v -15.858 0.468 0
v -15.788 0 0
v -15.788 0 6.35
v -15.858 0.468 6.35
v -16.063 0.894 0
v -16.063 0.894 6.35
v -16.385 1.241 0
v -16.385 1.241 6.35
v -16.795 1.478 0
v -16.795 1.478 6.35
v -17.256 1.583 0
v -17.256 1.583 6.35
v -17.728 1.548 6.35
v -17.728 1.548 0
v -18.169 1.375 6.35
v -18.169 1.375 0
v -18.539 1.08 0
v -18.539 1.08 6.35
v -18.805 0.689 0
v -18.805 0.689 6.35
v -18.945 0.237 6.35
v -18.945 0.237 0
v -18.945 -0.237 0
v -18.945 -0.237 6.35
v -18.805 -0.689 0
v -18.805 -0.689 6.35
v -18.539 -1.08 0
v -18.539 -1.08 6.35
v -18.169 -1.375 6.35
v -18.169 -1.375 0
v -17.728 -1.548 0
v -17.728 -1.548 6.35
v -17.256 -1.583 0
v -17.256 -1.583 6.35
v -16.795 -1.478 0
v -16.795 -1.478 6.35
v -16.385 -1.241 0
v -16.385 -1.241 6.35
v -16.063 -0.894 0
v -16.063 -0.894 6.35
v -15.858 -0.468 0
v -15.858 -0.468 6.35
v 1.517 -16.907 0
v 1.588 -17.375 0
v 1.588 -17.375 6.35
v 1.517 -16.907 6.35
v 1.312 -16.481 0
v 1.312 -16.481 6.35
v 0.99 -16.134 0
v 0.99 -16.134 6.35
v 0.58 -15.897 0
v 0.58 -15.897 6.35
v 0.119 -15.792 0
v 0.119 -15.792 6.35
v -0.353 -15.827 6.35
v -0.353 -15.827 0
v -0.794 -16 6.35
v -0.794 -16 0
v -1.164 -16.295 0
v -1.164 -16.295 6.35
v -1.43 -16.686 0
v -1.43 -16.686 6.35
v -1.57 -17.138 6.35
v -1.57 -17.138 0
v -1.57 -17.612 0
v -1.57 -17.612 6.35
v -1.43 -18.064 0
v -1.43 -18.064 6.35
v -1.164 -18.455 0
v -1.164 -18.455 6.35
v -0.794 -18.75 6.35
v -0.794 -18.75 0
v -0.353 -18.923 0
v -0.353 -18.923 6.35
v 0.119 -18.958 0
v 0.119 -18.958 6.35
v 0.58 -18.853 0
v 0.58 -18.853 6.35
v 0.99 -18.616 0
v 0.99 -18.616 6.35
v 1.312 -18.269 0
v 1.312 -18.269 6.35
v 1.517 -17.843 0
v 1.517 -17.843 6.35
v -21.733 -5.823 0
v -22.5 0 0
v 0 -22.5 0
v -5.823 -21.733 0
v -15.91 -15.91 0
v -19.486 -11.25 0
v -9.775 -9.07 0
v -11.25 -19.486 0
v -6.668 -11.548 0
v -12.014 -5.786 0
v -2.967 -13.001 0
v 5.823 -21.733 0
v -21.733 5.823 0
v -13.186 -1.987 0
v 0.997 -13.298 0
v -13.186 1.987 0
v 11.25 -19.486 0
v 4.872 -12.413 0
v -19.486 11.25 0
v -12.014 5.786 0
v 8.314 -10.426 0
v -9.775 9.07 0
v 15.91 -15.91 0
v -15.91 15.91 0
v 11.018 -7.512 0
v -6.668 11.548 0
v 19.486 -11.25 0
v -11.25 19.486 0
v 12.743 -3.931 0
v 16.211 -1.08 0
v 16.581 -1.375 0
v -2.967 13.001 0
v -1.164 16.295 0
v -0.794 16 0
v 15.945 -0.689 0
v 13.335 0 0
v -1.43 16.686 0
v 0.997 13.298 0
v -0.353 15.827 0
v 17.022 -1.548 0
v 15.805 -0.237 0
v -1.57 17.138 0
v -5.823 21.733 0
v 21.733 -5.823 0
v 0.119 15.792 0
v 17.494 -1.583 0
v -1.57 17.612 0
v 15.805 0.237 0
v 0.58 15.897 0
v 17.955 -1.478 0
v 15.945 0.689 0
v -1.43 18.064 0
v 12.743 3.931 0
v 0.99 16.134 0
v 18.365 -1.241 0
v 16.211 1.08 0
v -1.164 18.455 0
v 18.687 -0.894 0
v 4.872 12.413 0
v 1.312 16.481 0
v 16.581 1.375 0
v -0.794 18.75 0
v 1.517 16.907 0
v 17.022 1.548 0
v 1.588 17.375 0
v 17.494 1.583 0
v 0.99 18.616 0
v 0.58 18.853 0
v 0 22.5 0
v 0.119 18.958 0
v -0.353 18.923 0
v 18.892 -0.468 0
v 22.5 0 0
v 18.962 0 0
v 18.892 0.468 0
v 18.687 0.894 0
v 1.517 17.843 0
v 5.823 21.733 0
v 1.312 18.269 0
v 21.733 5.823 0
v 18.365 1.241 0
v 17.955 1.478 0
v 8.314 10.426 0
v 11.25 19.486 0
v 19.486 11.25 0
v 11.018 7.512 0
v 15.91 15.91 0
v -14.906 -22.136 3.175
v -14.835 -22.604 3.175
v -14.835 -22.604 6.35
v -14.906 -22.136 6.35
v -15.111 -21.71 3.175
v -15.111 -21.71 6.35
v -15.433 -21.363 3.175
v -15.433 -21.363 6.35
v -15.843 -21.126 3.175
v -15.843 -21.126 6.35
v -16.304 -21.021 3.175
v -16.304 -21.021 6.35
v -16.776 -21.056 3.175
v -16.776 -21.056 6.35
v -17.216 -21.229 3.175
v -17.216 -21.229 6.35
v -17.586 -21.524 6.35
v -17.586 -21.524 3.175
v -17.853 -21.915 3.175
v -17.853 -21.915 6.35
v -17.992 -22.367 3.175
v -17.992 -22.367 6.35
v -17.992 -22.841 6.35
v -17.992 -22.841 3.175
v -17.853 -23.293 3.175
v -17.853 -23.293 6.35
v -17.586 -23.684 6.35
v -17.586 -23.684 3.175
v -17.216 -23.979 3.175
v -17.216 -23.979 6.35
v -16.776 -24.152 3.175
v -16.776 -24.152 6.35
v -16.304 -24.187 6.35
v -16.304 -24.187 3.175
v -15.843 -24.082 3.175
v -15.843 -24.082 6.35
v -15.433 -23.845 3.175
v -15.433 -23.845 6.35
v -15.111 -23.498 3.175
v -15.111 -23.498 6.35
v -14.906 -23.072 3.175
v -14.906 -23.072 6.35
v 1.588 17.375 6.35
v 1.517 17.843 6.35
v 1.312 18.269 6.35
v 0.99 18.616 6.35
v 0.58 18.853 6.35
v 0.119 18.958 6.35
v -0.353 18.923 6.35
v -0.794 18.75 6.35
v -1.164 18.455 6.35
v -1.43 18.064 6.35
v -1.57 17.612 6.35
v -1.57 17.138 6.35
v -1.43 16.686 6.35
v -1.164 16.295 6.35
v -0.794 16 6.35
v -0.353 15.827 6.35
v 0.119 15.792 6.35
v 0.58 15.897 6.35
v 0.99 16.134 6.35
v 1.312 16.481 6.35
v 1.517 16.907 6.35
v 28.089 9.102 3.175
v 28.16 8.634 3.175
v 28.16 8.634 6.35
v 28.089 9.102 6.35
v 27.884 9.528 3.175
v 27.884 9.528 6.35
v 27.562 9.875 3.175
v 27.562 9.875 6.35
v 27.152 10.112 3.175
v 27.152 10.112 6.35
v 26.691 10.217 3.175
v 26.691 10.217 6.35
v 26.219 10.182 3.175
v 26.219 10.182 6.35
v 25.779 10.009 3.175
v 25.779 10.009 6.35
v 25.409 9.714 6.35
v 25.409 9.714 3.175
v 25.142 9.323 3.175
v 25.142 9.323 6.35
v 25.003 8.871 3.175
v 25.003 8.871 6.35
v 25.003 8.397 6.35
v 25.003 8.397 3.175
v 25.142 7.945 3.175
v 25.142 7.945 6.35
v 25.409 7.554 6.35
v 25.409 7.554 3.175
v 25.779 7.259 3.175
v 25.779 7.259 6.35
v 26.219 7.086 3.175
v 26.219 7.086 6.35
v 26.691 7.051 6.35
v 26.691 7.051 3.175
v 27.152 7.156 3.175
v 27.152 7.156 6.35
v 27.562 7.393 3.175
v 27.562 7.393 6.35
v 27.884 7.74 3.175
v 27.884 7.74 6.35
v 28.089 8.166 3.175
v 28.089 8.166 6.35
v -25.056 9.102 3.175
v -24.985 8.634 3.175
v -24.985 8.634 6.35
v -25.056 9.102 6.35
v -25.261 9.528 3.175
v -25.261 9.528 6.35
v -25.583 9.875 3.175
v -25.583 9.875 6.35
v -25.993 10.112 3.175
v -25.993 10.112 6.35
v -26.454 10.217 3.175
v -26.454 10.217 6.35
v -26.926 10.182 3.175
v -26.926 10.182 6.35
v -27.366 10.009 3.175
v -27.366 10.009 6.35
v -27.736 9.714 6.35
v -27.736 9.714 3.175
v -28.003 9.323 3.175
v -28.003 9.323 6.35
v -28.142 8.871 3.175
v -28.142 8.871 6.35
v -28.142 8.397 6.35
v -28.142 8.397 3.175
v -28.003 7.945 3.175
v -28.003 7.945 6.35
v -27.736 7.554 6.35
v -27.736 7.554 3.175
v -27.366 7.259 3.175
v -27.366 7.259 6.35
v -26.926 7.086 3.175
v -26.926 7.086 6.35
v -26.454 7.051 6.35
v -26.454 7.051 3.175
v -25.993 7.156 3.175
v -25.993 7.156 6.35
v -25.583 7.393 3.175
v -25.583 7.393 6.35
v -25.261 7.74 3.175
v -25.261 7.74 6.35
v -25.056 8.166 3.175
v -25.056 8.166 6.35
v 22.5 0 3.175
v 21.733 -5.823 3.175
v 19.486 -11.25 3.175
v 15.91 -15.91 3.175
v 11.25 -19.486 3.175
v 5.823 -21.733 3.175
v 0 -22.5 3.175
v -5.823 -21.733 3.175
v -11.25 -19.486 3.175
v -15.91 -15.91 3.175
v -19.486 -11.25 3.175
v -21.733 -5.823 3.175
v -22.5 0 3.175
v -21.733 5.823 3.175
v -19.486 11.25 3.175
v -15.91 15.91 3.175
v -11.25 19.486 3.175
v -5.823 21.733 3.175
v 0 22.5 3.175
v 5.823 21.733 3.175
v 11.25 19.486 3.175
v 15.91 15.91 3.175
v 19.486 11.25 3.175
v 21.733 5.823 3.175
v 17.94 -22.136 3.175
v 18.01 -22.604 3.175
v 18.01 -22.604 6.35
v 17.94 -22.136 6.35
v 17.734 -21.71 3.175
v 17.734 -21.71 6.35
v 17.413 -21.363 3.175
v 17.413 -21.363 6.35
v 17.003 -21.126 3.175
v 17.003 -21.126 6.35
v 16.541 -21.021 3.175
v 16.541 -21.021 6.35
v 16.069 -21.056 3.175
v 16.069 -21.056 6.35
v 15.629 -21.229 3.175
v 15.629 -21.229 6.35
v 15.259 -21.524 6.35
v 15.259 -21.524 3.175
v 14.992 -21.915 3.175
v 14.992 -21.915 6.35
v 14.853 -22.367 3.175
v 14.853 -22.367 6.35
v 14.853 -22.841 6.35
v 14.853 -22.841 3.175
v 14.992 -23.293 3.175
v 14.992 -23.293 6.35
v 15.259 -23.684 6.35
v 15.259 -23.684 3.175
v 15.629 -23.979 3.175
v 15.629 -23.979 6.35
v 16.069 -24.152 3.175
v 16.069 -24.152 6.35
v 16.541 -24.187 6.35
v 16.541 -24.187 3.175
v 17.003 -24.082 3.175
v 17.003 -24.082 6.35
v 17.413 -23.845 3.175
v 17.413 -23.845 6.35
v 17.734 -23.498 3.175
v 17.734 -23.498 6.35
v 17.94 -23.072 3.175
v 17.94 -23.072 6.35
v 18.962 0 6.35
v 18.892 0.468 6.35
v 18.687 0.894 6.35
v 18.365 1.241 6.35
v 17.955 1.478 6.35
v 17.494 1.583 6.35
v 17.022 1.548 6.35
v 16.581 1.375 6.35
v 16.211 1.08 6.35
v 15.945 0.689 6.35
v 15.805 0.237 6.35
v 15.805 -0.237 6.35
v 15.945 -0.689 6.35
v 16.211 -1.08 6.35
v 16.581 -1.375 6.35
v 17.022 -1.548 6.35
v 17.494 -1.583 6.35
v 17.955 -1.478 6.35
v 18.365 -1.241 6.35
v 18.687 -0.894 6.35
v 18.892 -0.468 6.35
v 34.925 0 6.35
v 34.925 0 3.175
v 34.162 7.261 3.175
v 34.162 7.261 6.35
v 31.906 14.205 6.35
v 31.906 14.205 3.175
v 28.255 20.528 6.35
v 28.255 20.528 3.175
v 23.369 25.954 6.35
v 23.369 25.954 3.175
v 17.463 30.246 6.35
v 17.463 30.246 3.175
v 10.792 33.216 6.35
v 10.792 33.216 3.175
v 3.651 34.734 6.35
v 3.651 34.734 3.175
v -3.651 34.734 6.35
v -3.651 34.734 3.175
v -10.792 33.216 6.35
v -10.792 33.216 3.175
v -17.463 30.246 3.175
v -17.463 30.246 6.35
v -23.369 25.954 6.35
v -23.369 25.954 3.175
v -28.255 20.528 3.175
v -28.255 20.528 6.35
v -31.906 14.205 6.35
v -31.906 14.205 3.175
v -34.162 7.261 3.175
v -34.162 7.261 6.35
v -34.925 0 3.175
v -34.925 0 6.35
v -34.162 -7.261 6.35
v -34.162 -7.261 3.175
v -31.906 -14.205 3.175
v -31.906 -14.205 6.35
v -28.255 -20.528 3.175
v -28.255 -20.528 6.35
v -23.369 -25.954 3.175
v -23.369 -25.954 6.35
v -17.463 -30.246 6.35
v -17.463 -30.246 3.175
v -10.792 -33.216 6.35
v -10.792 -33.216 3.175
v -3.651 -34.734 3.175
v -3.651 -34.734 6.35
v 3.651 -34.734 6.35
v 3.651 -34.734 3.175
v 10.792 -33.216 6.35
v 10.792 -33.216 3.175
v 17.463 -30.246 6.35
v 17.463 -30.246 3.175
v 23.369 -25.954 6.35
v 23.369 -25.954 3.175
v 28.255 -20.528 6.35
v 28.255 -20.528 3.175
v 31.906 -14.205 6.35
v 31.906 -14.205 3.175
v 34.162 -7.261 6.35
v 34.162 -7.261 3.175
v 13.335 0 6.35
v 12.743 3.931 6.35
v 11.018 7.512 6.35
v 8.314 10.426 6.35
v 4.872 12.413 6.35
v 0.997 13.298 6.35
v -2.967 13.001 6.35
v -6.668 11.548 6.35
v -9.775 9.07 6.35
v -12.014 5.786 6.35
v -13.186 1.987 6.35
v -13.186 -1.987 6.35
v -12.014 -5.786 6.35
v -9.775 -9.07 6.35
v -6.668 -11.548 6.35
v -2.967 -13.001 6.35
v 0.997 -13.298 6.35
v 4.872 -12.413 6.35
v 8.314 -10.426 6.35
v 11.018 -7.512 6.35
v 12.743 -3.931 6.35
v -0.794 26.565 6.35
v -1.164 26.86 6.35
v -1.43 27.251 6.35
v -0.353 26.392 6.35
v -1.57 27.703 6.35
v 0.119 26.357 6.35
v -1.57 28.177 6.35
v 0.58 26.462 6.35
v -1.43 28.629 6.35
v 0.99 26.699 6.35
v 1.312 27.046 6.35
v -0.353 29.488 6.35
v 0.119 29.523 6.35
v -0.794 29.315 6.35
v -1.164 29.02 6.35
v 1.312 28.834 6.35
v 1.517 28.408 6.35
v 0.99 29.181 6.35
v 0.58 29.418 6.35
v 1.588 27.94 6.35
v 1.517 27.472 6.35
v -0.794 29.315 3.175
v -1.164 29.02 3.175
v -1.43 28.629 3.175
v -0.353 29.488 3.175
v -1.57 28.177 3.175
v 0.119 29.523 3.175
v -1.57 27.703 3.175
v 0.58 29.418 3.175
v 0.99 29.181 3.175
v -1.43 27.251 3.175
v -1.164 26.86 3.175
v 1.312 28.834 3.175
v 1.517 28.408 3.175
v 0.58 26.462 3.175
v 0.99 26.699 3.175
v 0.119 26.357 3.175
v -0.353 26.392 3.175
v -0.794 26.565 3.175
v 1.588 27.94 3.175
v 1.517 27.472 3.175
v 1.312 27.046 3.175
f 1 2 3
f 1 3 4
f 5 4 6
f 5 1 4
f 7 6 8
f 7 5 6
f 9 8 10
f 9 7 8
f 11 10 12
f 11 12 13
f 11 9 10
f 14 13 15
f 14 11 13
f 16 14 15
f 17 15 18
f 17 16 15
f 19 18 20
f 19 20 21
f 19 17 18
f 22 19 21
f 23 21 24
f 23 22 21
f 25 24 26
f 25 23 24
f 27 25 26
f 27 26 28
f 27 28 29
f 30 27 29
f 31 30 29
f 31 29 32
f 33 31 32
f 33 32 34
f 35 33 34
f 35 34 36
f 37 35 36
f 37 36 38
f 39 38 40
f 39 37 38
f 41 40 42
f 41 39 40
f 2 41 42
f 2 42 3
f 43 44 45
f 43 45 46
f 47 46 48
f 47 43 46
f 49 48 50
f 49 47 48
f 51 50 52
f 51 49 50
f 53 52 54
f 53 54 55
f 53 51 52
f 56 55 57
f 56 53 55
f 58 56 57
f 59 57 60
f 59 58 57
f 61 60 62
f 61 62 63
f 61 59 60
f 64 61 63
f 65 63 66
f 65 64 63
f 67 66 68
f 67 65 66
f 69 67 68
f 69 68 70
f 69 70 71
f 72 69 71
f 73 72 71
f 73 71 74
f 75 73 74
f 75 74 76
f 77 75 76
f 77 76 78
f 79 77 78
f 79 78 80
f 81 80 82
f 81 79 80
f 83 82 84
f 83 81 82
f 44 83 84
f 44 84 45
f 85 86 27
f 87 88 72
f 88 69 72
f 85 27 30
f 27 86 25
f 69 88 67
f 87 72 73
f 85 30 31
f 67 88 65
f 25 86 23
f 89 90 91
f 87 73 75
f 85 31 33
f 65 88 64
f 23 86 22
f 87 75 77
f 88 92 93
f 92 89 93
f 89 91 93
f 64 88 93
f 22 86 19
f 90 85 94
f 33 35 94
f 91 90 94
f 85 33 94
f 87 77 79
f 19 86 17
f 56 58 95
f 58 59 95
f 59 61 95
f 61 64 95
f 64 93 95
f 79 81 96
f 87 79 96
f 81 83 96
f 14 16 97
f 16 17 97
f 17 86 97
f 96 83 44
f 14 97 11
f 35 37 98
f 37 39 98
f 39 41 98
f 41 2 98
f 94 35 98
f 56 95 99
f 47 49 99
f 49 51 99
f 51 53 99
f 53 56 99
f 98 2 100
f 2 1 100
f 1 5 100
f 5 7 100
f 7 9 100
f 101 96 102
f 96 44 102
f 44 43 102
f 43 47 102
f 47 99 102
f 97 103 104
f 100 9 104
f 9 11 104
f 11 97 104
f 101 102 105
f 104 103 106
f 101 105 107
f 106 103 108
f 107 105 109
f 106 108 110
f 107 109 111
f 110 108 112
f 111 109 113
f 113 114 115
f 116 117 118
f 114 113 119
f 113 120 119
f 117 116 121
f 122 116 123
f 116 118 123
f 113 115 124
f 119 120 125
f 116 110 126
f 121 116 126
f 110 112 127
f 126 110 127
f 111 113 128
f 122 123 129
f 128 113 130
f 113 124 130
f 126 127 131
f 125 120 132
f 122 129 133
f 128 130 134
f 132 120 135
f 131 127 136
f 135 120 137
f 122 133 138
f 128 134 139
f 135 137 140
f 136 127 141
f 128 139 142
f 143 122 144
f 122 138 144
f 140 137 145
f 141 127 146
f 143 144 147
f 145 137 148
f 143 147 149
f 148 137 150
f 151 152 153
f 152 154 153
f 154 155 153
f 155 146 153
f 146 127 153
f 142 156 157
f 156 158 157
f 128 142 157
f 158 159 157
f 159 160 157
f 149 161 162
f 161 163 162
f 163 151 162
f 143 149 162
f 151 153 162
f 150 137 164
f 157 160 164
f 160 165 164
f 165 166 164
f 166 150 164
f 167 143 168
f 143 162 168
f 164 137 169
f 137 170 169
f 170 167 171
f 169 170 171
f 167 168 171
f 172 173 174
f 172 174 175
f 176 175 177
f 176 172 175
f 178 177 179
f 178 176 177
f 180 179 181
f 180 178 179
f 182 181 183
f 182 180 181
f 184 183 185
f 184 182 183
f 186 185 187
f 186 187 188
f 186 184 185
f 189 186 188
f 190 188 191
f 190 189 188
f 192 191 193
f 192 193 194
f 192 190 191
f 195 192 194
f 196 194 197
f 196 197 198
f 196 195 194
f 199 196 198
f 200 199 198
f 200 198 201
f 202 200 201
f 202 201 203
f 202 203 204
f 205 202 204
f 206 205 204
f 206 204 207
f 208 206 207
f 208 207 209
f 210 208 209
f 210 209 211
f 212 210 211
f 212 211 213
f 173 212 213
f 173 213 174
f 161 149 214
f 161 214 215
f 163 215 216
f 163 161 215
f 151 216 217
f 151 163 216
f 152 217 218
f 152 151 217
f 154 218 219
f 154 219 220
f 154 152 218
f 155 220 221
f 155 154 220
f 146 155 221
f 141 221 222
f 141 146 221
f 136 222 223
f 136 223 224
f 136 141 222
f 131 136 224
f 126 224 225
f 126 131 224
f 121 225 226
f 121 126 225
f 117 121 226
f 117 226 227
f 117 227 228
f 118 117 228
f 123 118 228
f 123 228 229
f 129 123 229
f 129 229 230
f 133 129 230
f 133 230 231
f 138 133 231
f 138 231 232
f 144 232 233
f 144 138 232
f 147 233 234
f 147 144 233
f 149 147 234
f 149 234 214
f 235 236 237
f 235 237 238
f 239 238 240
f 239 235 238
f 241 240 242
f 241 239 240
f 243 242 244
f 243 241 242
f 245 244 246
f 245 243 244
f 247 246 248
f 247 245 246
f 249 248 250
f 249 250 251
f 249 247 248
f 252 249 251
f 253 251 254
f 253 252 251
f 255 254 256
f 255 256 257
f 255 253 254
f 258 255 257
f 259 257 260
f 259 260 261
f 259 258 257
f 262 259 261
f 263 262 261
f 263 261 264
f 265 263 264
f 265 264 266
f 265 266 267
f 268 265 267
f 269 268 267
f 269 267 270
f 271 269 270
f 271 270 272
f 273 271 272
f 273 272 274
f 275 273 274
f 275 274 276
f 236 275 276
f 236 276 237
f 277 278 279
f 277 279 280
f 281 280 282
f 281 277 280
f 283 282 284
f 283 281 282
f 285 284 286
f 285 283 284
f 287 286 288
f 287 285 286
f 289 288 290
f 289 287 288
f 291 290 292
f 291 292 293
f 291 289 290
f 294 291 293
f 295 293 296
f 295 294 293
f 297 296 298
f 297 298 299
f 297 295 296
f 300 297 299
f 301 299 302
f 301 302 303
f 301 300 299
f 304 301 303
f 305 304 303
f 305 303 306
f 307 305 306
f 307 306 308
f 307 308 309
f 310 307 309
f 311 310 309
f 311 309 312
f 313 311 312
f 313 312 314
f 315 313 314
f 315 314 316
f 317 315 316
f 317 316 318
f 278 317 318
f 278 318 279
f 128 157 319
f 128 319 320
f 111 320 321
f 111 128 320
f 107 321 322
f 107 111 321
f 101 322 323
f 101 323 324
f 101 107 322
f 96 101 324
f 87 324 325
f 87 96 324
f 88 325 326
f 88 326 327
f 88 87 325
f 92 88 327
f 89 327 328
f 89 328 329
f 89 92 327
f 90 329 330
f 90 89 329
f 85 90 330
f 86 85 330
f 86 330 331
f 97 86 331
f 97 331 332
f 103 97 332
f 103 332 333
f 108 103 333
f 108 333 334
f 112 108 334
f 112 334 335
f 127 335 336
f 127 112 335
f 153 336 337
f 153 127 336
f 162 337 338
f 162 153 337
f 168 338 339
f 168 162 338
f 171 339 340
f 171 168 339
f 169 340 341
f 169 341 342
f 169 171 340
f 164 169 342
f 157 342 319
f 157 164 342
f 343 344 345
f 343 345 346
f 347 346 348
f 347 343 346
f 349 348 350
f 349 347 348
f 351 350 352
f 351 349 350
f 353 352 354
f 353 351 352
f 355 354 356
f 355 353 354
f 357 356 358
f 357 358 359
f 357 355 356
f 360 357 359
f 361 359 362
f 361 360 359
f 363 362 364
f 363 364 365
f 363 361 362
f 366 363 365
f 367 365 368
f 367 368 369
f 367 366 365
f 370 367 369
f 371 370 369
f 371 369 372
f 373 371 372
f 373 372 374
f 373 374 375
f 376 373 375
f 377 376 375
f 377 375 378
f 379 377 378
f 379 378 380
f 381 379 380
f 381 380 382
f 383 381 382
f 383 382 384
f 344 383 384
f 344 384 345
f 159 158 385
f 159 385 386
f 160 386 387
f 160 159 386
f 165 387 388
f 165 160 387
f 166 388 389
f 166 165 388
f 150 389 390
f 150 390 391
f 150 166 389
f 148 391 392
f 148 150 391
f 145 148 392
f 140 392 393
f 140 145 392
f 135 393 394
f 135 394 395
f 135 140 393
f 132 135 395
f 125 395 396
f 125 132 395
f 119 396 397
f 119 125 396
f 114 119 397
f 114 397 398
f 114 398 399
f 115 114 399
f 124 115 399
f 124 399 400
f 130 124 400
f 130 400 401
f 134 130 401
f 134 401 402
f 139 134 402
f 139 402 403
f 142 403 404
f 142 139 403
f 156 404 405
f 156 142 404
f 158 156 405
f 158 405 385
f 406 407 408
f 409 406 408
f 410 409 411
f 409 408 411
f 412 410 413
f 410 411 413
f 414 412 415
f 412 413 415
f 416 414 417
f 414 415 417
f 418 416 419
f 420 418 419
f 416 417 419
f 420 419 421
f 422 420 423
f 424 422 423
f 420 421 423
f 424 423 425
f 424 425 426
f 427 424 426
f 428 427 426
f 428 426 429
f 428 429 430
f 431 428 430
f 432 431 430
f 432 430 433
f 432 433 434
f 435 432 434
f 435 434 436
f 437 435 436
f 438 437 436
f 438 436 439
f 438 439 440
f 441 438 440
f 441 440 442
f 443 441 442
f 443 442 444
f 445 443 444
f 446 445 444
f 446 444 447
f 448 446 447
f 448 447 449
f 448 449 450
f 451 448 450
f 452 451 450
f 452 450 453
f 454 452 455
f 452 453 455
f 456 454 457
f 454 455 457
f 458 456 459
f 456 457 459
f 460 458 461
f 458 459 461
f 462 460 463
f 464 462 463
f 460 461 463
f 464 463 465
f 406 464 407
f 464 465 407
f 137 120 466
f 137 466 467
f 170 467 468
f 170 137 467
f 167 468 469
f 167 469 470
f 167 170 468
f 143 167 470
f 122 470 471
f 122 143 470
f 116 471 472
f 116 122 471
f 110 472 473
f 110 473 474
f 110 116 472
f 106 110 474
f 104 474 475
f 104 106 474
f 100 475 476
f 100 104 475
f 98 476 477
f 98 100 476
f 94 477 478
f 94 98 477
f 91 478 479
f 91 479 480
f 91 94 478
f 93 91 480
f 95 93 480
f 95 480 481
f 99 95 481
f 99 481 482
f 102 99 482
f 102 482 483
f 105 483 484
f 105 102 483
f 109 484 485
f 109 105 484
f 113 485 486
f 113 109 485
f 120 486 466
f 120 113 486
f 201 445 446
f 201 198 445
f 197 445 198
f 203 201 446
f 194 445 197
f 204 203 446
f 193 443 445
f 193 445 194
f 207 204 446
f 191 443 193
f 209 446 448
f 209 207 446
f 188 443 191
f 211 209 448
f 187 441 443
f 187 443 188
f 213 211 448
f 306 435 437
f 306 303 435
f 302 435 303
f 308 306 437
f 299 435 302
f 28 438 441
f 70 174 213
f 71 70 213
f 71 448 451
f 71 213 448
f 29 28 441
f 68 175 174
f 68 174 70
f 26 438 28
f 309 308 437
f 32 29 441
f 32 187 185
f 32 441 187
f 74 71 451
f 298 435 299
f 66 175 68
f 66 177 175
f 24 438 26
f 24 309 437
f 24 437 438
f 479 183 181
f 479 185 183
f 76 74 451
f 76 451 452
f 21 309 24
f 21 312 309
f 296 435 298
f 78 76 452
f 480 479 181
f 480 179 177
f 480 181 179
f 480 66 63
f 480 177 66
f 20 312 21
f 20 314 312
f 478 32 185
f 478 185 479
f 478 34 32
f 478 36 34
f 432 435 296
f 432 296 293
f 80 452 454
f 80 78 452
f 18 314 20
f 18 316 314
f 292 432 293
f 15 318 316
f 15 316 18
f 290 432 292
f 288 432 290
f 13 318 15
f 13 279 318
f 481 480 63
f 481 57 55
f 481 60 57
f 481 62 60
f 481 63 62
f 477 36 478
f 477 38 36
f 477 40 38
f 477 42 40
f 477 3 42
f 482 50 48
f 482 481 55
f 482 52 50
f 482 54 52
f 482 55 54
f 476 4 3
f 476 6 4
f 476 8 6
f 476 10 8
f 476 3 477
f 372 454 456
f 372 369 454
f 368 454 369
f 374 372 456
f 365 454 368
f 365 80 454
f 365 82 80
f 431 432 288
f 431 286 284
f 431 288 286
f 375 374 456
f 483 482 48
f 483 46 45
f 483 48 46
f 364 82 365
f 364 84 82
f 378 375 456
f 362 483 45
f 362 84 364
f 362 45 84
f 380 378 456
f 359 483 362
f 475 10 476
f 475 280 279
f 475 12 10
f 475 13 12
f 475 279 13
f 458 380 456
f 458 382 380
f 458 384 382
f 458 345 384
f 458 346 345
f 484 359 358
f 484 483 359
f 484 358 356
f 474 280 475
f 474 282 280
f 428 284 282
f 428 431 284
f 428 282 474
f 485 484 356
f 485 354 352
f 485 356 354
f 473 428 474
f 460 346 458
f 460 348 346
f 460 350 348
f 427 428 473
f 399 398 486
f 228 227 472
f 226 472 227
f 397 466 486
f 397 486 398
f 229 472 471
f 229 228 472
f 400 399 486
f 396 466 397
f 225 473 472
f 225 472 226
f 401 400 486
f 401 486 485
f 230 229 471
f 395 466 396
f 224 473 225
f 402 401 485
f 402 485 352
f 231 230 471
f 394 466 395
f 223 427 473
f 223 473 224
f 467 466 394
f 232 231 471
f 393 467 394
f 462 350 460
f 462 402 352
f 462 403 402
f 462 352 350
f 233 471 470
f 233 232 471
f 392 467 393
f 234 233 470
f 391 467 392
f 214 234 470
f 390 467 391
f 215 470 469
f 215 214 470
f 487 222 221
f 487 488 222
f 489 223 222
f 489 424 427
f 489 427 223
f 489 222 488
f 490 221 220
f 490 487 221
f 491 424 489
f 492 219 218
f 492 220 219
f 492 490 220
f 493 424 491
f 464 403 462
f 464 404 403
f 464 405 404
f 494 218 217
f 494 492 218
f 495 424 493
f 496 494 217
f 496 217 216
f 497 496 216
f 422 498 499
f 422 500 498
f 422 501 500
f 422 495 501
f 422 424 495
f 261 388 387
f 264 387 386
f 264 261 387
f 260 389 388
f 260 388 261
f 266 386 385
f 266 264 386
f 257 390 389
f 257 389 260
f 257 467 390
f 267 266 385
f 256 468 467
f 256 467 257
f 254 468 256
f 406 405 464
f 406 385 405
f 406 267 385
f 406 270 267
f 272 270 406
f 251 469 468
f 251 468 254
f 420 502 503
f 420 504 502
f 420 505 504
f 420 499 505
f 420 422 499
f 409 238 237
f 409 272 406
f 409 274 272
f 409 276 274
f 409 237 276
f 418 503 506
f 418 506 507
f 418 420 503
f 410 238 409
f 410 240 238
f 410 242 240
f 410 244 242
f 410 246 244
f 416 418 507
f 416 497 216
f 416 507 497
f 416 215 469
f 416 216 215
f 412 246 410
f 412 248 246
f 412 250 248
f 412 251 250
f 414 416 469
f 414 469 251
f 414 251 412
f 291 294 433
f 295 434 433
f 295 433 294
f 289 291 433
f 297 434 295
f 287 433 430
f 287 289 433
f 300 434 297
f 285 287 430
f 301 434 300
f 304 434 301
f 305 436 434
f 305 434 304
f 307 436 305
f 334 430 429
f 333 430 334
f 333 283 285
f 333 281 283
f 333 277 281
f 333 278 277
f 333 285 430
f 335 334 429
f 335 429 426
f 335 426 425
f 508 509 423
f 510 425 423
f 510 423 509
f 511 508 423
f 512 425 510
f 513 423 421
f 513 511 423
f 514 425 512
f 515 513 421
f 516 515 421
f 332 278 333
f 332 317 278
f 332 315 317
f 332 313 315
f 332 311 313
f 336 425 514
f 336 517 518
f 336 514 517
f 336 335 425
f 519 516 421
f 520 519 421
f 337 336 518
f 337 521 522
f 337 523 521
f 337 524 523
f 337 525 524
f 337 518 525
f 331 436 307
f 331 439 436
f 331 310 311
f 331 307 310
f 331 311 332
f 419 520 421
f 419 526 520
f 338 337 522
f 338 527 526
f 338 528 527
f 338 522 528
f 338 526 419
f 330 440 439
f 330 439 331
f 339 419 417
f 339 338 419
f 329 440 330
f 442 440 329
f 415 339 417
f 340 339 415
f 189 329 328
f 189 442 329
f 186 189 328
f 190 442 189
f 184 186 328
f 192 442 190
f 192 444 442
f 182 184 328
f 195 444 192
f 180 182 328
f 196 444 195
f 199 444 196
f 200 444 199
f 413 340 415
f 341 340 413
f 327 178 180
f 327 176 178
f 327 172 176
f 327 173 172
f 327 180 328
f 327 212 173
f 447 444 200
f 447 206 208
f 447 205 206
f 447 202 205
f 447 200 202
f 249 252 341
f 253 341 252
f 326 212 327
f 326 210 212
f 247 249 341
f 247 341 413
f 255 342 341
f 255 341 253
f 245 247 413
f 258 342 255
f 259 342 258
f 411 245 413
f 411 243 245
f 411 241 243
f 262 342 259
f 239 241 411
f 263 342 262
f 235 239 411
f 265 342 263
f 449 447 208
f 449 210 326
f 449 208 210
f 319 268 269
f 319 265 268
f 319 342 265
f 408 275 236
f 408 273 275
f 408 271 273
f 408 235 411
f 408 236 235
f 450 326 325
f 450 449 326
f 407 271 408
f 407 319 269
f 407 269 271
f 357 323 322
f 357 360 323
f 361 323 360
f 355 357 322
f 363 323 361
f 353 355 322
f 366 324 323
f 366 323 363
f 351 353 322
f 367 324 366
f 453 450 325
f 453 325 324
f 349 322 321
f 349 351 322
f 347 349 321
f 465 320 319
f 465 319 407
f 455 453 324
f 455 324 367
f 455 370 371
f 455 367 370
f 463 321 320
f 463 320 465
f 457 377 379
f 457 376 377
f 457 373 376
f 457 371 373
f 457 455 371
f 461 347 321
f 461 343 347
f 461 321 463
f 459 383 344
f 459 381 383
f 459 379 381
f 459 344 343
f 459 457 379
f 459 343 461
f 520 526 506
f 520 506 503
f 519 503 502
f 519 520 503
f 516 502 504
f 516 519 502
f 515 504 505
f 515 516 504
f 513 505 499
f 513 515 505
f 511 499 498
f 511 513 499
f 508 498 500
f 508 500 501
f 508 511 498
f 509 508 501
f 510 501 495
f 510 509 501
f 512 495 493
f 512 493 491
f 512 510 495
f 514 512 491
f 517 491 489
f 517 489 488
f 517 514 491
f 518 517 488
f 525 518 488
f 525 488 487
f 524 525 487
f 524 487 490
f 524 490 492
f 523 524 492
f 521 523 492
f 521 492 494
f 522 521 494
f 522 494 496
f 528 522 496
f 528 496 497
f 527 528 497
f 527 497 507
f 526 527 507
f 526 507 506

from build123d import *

# Parameters (mm, degrees)
F0_R     = 34.925
F0_R_2   = 1.5875
F0_R_3   = 13.335
F1_DEPTH = 6.35
F2_R     = 34.925
F2_R_2   = 22.5
F3_DEPTH = 3.175


with BuildPart() as f1:
    # F0 (on Top) → F1 (new body)
    with BuildSketch(Plane.XY):
        Circle(F0_R)
        with Locations((-16.42272, -22.603935)):
            Circle(F0_R_2, mode=Mode.SUBTRACT)
        with Locations((16.42272, -22.603935)):
            Circle(F0_R_2, mode=Mode.SUBTRACT)
        with Locations((0, -17.375)):
            Circle(F0_R_2, mode=Mode.SUBTRACT)
        with Locations((-26.572519, 8.633935)):
            Circle(F0_R_2, mode=Mode.SUBTRACT)
        with Locations((-17.375, 0)):
            Circle(F0_R_2, mode=Mode.SUBTRACT)
        Circle(F0_R_3, mode=Mode.SUBTRACT)
        with Locations((17.375, 0)):
            Circle(F0_R_2, mode=Mode.SUBTRACT)
        with Locations((0, 17.375)):
            Circle(F0_R_2, mode=Mode.SUBTRACT)
        with Locations((26.572519, 8.633935)):
            Circle(F0_R_2, mode=Mode.SUBTRACT)
        with Locations((0, 27.94)):
            Circle(F0_R_2, mode=Mode.SUBTRACT)
    extrude(amount=F1_DEPTH)

    # F2 (on face) → F3 (cut)
    with BuildSketch(Plane(origin=(0, 0, 0), x_dir=(1, 0, 0), z_dir=(0, 0, -1))):
        Circle(F2_R)
        Circle(F2_R_2, mode=Mode.SUBTRACT)
    extrude(amount=-F3_DEPTH, mode=Mode.SUBTRACT)


solid = f1.part
